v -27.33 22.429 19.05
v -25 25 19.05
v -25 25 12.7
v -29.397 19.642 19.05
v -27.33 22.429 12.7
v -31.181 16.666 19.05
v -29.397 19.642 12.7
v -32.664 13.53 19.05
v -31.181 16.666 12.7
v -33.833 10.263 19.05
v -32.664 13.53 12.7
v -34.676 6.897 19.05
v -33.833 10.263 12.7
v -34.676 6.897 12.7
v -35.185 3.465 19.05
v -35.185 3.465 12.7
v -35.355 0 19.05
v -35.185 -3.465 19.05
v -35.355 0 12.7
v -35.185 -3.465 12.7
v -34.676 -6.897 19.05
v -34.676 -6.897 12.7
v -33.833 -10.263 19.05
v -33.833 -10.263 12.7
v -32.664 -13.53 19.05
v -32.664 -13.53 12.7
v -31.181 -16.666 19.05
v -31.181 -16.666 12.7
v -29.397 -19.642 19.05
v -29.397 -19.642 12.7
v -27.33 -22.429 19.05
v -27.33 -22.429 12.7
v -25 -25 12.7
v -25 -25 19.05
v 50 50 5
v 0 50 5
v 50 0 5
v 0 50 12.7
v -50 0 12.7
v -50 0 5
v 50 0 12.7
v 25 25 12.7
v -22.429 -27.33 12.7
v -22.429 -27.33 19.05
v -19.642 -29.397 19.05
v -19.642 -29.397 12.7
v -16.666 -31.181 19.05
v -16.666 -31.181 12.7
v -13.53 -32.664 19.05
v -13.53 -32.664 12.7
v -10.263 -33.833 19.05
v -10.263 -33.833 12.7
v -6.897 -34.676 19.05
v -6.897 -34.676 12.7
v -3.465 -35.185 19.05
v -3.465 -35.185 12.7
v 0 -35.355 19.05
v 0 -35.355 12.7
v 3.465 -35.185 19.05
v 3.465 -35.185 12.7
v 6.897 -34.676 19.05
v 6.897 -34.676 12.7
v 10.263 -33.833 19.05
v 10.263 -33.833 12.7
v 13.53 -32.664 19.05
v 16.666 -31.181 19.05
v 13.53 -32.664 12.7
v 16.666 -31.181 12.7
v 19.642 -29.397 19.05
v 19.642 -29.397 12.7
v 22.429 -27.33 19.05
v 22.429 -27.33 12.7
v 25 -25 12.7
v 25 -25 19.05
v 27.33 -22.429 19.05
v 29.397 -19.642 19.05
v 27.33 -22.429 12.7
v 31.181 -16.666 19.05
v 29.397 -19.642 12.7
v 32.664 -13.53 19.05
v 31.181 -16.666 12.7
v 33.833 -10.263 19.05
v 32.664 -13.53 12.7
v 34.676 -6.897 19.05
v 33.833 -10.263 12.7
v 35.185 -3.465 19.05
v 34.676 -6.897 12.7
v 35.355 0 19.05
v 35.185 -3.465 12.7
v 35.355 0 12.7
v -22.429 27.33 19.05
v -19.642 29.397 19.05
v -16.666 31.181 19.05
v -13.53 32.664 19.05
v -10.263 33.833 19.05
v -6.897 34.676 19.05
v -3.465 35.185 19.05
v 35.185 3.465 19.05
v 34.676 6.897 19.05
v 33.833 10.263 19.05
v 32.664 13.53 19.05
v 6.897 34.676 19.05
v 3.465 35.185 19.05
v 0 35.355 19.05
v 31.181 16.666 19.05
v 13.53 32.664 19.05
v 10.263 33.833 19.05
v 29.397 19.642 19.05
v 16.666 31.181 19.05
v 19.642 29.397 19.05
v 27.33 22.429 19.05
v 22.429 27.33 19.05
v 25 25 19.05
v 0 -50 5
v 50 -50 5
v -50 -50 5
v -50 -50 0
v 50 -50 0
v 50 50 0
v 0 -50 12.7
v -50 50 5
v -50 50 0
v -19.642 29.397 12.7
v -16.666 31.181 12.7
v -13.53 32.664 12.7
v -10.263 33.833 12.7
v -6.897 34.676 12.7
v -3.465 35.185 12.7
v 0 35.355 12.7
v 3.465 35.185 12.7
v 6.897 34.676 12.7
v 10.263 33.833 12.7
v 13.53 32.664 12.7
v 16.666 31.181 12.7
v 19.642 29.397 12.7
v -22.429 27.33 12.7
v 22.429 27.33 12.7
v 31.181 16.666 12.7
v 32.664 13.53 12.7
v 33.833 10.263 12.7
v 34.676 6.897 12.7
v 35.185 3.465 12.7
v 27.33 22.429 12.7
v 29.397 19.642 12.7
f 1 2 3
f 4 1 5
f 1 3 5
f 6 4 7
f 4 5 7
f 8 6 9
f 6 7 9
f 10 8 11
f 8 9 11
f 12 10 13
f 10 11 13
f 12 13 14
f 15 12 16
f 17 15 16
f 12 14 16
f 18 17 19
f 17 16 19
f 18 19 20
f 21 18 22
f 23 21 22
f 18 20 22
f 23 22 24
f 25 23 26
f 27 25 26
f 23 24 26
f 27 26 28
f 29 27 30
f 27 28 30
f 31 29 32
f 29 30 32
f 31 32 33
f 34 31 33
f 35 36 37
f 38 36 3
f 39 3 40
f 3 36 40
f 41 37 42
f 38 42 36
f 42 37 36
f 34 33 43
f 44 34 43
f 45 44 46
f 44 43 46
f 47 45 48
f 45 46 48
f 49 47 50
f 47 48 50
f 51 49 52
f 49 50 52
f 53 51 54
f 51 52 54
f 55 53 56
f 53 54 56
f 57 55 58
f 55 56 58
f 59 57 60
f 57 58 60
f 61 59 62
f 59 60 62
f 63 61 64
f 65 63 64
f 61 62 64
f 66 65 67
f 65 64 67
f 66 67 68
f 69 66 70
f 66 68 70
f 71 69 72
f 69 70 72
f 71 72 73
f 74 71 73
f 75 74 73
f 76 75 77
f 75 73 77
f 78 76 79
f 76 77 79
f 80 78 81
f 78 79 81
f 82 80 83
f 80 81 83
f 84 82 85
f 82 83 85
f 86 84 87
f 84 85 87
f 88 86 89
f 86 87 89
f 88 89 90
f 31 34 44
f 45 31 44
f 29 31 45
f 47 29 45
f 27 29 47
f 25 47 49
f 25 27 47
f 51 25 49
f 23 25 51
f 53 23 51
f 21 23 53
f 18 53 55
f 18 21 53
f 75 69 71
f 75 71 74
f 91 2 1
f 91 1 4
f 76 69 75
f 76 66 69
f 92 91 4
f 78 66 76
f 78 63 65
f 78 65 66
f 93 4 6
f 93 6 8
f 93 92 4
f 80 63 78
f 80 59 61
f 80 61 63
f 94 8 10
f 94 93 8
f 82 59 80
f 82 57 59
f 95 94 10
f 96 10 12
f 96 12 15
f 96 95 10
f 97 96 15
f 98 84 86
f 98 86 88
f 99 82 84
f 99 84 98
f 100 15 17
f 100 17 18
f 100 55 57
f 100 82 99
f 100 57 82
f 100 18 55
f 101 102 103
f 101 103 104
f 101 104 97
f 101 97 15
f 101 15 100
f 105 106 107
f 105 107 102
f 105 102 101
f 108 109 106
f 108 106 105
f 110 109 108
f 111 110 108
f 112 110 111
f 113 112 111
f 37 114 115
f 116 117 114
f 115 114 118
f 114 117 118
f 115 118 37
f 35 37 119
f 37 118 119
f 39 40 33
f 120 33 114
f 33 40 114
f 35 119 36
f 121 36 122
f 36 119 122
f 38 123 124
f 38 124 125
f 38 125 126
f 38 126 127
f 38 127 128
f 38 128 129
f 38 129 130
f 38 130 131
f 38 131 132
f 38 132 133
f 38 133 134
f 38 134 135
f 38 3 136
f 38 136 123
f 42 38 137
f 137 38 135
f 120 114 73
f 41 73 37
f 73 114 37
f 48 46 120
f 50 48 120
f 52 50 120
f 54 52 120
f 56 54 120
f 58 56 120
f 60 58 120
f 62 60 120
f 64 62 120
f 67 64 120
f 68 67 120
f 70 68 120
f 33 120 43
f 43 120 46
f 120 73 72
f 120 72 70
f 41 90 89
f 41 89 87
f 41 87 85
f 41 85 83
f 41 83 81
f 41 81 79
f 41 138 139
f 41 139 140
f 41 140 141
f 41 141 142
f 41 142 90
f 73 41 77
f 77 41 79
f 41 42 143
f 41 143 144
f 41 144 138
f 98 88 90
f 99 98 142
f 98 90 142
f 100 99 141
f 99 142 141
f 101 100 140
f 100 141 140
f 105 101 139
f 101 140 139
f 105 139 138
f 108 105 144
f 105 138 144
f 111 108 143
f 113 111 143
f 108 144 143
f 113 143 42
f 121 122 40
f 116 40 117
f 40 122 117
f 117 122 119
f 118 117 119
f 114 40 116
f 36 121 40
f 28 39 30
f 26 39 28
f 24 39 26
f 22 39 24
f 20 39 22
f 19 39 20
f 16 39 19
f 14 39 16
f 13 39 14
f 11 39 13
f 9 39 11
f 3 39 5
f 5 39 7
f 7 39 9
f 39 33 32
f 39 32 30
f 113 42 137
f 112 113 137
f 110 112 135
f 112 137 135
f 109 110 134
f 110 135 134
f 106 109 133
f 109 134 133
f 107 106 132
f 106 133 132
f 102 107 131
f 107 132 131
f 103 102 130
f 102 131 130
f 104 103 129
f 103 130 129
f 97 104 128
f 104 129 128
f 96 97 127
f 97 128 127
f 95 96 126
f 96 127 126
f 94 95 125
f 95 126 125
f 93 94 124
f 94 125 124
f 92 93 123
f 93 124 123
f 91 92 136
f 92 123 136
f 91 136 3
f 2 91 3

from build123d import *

# Parameters (mm, degrees)
F1_DEPTH = 5
F2_DEPTH = 12.7
F3_DEPTH = 19.05


with BuildPart() as f1:
    # F0 (on Top) → F1 (new body)
    with BuildSketch(Plane.XY):
        Polygon((50, 0), (50, 50), (0, 50), (25.0000000711, 24.9999999289), align=None)
        Polygon((-24.9999998008, 25.0000001992), (0, 50), (-50, 50), (-50, 0), align=None)
        Polygon((50, -50), (50, 0), (25.000000115, -24.999999885), (0, -50), align=None)
        with BuildLine():
            ThreePointArc((25.0000000711, 24.9999999289), (1.911e-07, 35.3553390593), (-24.9999998008, 25.0000001992))
            ThreePointArc((-24.9999998008, 25.0000001992), (-35.3553390593, 1.963e-07), (-25.0000000784, -24.9999999216))
            ThreePointArc((-25.0000000784, -24.9999999216), (2.59e-08, -35.3553390593), (25.000000115, -24.999999885))
            ThreePointArc((25.000000115, -24.999999885), (32.664074153, -13.5299024285), (35.3553390593, 0))
            ThreePointArc((35.3553390593, 0), (32.6640741411, 13.5299024572), (25.0000000711, 24.9999999289))
        make_face()
        with BuildLine():
            Line((25.0000000711, 24.9999999289), (0, 50))
            Line((0, 50), (-24.9999998008, 25.0000001992))
            ThreePointArc((-24.9999998008, 25.0000001992), (1.911e-07, 35.3553390593), (25.0000000711, 24.9999999289))
        make_face()
        with BuildLine():
            ThreePointArc((-25.0000000784, -24.9999999216), (-35.3553390593, 1.963e-07), (-24.9999998008, 25.0000001992))
            Line((-24.9999998008, 25.0000001992), (-50, 0))
            Line((-50, 0), (-25.0000000784, -24.9999999216))
        make_face()
        Polygon((-25.0000000784, -24.9999999216), (-50, 0), (-50, -50), (0, -50), align=None)
        with BuildLine():
            Line((25.000000115, -24.999999885), (50, 0))
            Line((50, 0), (25.0000000711, 24.9999999289))
            ThreePointArc((25.0000000711, 24.9999999289), (32.6640741411, 13.5299024572), (35.3553390593, 0))
            ThreePointArc((35.3553390593, 0), (32.664074153, -13.5299024285), (25.000000115, -24.999999885))
        make_face()
        with BuildLine():
            Line((0, -50), (25.000000115, -24.999999885))
            ThreePointArc((25.000000115, -24.999999885), (2.59e-08, -35.3553390593), (-25.0000000784, -24.9999999216))
            Line((-25.0000000784, -24.9999999216), (0, -50))
        make_face()
    extrude(amount=F1_DEPTH)

    # F0 (on Top) → F2 (join)
    with BuildSketch(Plane.XY):
        with BuildLine():
            ThreePointArc((-25.0000000784, -24.9999999216), (-35.3553390593, 1.963e-07), (-24.9999998008, 25.0000001992))
            Line((-24.9999998008, 25.0000001992), (-50, 0))
            Line((-50, 0), (-25.0000000784, -24.9999999216))
        make_face()
        with BuildLine():
            Line((25.000000115, -24.999999885), (50, 0))
            Line((50, 0), (25.0000000711, 24.9999999289))
            ThreePointArc((25.0000000711, 24.9999999289), (32.6640741411, 13.5299024572), (35.3553390593, 0))
            ThreePointArc((35.3553390593, 0), (32.664074153, -13.5299024285), (25.000000115, -24.999999885))
        make_face()
        with BuildLine():
            Line((0, -50), (25.000000115, -24.999999885))
            ThreePointArc((25.000000115, -24.999999885), (2.59e-08, -35.3553390593), (-25.0000000784, -24.9999999216))
            Line((-25.0000000784, -24.9999999216), (0, -50))
        make_face()
        with BuildLine():
            ThreePointArc((25.0000000711, 24.9999999289), (1.911e-07, 35.3553390593), (-24.9999998008, 25.0000001992))
            ThreePointArc((-24.9999998008, 25.0000001992), (-35.3553390593, 1.963e-07), (-25.0000000784, -24.9999999216))
            ThreePointArc((-25.0000000784, -24.9999999216), (2.59e-08, -35.3553390593), (25.000000115, -24.999999885))
            ThreePointArc((25.000000115, -24.999999885), (32.664074153, -13.5299024285), (35.3553390593, 0))
            ThreePointArc((35.3553390593, 0), (32.6640741411, 13.5299024572), (25.0000000711, 24.9999999289))
        make_face()
        with BuildLine():
            Line((25.0000000711, 24.9999999289), (0, 50))
            Line((0, 50), (-24.9999998008, 25.0000001992))
            ThreePointArc((-24.9999998008, 25.0000001992), (1.911e-07, 35.3553390593), (25.0000000711, 24.9999999289))
        make_face()
    extrude(amount=F2_DEPTH)

    # F0 (on Top) → F3 (join)
    with BuildSketch(Plane.XY):
        with BuildLine():
            ThreePointArc((25.0000000711, 24.9999999289), (1.911e-07, 35.3553390593), (-24.9999998008, 25.0000001992))
            ThreePointArc((-24.9999998008, 25.0000001992), (-35.3553390593, 1.963e-07), (-25.0000000784, -24.9999999216))
            ThreePointArc((-25.0000000784, -24.9999999216), (2.59e-08, -35.3553390593), (25.000000115, -24.999999885))
            ThreePointArc((25.000000115, -24.999999885), (32.664074153, -13.5299024285), (35.3553390593, 0))
            ThreePointArc((35.3553390593, 0), (32.6640741411, 13.5299024572), (25.0000000711, 24.9999999289))
        make_face()
    extrude(amount=F3_DEPTH)


solid = f1.part
